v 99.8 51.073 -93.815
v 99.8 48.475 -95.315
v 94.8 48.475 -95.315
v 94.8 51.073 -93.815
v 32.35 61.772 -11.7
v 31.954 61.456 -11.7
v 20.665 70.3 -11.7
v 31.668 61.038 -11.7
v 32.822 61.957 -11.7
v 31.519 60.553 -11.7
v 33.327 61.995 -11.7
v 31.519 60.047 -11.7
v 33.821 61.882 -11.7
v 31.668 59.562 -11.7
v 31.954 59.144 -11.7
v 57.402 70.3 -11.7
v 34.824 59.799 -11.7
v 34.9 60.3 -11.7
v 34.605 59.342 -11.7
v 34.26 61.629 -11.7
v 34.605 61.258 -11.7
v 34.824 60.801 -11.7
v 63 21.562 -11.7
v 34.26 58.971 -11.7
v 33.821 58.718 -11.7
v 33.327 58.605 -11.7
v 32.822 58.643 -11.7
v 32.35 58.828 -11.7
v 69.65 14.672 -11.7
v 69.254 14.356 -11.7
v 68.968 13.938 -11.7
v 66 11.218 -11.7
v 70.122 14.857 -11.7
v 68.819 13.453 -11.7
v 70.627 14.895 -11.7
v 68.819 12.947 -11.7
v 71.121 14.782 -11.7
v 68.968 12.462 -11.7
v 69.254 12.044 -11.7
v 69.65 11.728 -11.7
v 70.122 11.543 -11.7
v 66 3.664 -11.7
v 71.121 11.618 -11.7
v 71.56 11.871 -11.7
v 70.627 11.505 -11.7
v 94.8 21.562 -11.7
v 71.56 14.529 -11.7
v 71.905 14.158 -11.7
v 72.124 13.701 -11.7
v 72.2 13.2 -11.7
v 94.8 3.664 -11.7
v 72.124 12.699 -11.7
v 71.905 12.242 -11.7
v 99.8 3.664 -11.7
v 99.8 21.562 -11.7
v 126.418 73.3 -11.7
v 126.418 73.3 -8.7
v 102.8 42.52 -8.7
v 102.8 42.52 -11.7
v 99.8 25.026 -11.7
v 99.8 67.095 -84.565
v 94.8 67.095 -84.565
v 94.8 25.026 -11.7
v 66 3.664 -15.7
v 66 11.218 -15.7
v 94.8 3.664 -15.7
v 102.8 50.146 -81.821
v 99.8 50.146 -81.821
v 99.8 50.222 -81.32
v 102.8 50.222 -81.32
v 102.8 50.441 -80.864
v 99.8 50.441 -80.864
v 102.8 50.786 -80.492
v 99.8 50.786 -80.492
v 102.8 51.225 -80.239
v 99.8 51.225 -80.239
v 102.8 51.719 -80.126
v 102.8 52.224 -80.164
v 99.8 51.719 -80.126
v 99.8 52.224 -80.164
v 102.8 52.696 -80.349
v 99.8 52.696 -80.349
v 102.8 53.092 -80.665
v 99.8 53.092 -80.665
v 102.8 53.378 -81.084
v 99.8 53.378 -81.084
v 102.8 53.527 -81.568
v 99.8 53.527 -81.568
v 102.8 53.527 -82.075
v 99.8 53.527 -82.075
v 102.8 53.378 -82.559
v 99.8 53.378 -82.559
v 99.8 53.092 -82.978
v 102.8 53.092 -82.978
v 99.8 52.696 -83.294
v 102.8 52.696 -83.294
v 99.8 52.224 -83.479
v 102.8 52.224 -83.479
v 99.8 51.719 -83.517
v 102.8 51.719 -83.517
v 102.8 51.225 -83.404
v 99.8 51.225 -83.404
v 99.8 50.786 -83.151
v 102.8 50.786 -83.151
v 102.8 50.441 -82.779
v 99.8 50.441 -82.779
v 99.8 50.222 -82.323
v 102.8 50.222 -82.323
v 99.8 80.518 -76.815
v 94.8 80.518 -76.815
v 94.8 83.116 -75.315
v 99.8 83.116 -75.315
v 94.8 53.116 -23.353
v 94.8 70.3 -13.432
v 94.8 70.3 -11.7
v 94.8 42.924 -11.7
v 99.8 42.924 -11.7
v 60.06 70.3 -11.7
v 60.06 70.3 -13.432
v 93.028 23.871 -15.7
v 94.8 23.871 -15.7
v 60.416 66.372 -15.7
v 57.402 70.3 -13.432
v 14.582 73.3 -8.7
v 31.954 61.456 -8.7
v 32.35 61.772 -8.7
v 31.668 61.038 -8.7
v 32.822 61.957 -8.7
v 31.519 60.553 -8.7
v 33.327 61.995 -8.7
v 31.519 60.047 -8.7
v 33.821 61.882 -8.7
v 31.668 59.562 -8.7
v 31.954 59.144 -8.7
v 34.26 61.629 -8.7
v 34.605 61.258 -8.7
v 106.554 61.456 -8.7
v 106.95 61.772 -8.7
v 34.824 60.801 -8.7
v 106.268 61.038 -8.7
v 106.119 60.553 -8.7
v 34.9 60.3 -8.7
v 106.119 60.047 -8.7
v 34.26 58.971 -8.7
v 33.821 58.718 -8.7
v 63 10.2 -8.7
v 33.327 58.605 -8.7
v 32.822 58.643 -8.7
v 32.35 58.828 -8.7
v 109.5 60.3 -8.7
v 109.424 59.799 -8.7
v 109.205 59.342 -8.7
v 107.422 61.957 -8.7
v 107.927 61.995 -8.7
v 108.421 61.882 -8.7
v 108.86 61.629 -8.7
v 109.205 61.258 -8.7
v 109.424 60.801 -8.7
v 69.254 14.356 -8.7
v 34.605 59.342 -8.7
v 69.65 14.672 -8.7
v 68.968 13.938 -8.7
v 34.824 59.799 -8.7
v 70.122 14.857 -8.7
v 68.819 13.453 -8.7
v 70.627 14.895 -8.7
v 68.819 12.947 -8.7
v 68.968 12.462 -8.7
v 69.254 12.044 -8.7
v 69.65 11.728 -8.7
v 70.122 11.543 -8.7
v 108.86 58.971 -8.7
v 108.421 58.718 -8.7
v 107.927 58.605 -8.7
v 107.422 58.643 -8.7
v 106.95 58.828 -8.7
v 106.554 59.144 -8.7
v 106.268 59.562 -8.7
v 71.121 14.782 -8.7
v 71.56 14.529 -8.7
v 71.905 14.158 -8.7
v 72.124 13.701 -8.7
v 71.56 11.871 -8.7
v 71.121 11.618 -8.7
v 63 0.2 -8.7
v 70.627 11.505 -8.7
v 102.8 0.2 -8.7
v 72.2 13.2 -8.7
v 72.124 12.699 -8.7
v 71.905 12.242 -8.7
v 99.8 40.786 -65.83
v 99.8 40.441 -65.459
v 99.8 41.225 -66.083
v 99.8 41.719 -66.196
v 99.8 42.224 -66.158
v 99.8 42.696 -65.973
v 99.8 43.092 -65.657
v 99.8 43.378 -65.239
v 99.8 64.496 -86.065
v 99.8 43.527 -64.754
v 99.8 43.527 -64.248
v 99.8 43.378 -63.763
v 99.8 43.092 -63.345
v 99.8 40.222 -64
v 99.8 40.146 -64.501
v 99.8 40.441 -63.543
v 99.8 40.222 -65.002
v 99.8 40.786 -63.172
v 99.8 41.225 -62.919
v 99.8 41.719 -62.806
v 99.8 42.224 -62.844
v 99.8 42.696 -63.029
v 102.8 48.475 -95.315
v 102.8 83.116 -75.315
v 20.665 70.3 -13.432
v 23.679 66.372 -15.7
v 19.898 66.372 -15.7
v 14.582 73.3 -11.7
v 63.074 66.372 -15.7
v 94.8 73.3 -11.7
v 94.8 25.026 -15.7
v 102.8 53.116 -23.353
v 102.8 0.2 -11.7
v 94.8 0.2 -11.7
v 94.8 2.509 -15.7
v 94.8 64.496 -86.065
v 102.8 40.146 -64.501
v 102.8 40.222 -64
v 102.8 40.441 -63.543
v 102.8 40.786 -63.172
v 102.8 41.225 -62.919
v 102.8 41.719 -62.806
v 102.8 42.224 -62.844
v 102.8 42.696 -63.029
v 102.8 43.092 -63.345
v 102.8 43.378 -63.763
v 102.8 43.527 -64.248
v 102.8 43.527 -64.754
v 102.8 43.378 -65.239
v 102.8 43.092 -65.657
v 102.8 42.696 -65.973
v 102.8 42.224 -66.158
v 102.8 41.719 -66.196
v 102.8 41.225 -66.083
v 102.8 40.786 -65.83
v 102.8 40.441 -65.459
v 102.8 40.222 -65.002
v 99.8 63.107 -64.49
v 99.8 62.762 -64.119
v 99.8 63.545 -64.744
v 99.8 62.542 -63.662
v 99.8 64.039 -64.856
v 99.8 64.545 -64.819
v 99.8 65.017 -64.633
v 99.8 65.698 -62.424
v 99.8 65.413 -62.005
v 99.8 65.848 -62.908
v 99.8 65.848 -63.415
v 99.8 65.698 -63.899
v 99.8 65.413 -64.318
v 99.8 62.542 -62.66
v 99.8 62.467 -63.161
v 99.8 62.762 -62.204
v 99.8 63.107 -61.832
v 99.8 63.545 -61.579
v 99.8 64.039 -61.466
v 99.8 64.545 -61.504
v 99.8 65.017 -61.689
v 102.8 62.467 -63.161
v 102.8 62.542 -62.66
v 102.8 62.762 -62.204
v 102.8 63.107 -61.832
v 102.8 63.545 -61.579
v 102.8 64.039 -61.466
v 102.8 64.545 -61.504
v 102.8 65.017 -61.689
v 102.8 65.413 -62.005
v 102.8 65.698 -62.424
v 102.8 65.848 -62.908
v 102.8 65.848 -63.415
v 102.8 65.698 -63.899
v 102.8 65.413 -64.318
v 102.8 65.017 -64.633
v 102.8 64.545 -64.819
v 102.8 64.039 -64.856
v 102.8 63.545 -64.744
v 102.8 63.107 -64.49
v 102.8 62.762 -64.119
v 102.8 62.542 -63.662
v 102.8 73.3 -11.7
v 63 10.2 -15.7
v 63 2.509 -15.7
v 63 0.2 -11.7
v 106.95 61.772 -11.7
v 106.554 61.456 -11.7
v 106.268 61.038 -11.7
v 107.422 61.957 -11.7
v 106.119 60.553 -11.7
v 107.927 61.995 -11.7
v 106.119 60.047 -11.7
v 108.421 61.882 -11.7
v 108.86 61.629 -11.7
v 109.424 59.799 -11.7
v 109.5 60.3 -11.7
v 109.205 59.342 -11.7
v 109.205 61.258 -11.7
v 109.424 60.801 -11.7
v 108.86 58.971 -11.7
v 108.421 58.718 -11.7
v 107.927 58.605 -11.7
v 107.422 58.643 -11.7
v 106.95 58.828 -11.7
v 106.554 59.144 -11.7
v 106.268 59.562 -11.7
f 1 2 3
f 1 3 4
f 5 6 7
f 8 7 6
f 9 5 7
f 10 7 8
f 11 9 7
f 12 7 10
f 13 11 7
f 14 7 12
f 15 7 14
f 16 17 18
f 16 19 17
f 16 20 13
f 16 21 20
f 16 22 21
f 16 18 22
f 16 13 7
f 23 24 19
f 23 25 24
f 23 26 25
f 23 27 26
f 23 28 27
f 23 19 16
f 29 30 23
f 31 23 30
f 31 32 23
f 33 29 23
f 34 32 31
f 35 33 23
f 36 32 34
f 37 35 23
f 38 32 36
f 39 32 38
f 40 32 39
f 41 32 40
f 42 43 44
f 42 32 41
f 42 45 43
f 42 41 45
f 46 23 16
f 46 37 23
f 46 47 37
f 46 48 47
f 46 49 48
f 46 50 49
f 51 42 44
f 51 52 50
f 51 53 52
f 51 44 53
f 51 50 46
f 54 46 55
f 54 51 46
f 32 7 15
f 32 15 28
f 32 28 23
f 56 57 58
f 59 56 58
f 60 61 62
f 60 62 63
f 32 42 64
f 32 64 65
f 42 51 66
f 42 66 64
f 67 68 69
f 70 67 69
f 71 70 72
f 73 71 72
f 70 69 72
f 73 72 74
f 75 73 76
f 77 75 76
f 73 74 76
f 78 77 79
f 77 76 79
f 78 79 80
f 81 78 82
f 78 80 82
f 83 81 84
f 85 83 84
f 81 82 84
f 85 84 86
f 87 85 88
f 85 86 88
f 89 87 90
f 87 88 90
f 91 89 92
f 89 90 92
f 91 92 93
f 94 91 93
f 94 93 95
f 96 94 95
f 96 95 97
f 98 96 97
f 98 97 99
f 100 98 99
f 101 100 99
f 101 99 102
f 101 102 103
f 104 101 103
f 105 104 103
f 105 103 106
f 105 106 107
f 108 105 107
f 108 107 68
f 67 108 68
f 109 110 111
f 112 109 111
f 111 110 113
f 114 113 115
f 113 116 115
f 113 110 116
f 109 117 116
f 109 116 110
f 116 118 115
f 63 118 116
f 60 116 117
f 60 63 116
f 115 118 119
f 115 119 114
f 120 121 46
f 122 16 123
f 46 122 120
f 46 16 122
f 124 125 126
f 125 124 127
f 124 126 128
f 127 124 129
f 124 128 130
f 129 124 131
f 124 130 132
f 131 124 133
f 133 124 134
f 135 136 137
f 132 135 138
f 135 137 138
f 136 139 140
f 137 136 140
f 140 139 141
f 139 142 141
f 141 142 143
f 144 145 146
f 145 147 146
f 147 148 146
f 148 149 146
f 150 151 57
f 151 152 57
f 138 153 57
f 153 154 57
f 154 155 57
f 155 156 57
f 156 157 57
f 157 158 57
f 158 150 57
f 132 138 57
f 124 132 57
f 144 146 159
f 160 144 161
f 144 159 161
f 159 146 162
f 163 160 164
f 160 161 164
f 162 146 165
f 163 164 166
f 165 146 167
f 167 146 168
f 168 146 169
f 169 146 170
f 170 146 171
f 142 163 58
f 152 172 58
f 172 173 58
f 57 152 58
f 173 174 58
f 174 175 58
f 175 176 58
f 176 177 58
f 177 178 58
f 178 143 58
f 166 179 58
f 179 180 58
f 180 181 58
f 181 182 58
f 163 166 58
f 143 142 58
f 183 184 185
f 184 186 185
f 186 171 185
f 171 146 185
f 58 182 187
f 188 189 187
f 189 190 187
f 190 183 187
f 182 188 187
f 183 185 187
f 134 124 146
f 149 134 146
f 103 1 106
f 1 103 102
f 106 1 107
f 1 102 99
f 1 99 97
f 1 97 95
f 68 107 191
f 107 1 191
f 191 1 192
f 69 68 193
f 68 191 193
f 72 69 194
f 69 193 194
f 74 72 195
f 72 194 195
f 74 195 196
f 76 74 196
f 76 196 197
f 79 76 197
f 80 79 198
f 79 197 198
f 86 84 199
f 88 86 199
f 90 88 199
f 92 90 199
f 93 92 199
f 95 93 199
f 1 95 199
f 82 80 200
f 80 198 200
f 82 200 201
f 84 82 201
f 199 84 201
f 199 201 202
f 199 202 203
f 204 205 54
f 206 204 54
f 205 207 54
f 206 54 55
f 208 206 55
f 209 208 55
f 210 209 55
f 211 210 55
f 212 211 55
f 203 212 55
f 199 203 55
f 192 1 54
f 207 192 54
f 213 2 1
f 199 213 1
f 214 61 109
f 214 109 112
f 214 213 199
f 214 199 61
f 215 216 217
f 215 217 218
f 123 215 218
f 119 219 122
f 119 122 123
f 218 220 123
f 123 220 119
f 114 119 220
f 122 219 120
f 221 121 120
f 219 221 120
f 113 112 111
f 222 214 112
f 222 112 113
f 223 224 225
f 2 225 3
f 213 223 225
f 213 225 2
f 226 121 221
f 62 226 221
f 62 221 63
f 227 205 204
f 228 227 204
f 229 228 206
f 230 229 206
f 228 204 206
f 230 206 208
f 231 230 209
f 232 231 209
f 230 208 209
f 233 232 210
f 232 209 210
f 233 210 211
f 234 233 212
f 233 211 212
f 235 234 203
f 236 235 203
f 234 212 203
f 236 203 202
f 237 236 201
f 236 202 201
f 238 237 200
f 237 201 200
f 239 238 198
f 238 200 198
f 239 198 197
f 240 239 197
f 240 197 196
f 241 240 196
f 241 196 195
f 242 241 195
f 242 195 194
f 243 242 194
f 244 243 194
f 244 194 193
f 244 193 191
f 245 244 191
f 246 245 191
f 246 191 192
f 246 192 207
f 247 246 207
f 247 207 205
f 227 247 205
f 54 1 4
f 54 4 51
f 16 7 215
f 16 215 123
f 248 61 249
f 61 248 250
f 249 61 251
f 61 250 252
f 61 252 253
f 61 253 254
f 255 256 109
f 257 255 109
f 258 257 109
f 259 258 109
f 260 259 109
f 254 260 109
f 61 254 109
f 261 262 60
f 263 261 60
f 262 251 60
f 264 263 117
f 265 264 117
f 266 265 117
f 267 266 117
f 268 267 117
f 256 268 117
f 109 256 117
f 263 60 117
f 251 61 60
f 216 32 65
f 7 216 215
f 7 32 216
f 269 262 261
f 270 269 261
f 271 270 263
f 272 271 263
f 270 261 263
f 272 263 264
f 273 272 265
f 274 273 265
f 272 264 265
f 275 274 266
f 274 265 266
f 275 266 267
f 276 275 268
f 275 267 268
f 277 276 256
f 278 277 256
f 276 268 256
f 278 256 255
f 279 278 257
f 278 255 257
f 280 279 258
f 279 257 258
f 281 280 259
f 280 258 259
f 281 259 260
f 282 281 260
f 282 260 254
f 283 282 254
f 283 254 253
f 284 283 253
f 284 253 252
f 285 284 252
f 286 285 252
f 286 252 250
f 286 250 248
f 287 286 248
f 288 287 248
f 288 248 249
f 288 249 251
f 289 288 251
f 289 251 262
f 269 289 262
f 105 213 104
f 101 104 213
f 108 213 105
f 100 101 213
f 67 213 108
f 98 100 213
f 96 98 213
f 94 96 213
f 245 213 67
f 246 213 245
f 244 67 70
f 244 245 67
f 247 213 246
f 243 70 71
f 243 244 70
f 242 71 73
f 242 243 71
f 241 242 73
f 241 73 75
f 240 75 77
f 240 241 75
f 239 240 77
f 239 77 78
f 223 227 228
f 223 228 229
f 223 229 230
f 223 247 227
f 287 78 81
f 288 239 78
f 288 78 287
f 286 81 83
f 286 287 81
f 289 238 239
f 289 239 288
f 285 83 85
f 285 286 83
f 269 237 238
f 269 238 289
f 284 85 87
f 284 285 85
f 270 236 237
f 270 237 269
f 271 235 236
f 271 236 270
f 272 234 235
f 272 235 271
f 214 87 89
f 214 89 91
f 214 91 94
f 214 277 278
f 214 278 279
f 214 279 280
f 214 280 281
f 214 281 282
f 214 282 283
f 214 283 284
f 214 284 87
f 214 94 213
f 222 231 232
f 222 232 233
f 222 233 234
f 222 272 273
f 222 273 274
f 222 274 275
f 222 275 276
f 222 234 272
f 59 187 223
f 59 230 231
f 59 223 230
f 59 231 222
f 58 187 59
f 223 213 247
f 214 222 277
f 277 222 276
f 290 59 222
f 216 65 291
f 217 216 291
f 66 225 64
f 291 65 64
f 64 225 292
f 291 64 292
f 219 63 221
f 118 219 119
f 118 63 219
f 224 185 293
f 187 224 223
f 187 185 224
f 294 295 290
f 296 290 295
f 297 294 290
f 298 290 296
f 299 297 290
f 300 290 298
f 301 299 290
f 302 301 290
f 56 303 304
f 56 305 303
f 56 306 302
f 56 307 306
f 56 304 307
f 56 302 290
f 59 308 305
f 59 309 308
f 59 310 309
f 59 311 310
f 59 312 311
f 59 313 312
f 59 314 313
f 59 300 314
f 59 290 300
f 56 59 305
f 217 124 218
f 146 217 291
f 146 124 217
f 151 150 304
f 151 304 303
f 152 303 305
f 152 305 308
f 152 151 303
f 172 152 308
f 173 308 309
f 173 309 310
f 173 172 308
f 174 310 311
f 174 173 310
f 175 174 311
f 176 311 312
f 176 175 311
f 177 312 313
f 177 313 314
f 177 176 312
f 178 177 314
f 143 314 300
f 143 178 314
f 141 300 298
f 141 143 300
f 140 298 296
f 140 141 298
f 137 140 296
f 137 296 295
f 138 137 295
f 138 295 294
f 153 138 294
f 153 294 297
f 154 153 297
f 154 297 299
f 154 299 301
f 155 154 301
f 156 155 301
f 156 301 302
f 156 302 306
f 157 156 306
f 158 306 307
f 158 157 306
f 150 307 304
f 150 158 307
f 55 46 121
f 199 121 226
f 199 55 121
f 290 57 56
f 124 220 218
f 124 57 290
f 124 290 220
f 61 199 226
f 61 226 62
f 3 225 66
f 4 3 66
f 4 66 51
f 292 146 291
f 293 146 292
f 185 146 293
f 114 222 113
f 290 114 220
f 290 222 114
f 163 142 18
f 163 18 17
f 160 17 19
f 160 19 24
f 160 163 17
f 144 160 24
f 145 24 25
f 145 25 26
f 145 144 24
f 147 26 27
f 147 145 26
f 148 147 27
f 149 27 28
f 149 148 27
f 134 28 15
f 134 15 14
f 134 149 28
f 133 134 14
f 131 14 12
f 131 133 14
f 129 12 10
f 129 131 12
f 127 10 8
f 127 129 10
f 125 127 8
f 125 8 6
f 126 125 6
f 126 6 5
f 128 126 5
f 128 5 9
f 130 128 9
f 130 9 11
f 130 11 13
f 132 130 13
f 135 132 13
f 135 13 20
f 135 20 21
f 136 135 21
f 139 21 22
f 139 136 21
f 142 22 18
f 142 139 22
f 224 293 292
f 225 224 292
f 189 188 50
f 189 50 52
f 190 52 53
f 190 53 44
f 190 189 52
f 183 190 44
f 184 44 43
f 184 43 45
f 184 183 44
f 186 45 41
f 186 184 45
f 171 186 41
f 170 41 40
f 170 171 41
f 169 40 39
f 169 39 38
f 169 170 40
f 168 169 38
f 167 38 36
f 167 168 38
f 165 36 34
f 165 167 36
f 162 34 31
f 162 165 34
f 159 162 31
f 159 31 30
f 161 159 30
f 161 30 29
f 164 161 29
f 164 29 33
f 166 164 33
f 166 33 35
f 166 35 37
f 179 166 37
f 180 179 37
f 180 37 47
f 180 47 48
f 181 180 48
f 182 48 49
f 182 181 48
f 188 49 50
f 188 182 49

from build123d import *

# Parameters (mm, degrees)
SKETCH027_R     = 1.7
PAD016_DEPTH    = 3
PAD017_DEPTH    = 3
SKETCH029_R     = 1.7
POCKET007_DEPTH = 26.619333
PAD018_DEPTH    = 5
PAD019_DEPTH    = 4
POCKET011_DEPTH = 31.8
POCKET012_DEPTH = 80.219333


with BuildPart() as part:
    # Sketch027 (on Face4 of Binder003) → Pad016 (new body)
    with BuildSketch(Plane(origin=(0, 0, -8.7), x_dir=(1, 0, 0), z_dir=(0, 0, -1))):
        Polygon((63, -0.2), (63, -10.2), (14.581667, -73.3), (126.418333, -73.3), (102.8, -42.519989), (102.8, -0.2), align=None)
        with Locations((70.5, -13.2)):
            Circle(SKETCH027_R, mode=Mode.SUBTRACT)
        with Locations((107.8, -60.3)):
            Circle(SKETCH027_R, mode=Mode.SUBTRACT)
        with Locations((33.2, -60.3)):
            Circle(SKETCH027_R, mode=Mode.SUBTRACT)
    extrude(amount=PAD016_DEPTH)

    # Sketch028 (on Face6 of Pad016) → Pad017 (join)
    with BuildSketch(Plane.YZ.offset(102.8)):
        Polygon((0.2, -11.7), (48.475, -95.314753), (83.116016, -75.314753), (53.116016, -23.353229), (73.3, -11.7), align=None)
    extrude(amount=-PAD017_DEPTH)

    # Sketch029 (on Face14 of Pad017) → Pocket007 (cut, through all)
    with BuildSketch(Plane(origin=(99.8, 0, 0), x_dir=(0, -1, 0), z_dir=(-1, 0, 0))):
        with Locations((-51.846002, -81.821499)):
            Circle(SKETCH029_R)
        with Locations((-41.846002, -64.500991)):
            Circle(SKETCH029_R)
        with Locations((-64.16651, -63.161245)):
            Circle(SKETCH029_R)
    extrude(amount=-POCKET007_DEPTH, mode=Mode.SUBTRACT)

    # Sketch030 (on Face14 of Pocket007) → Pad018 (join)
    with BuildSketch(Plane(origin=(99.8, 0, 0), x_dir=(0, -1, 0), z_dir=(-1, 0, 0))):
        Polygon((-0.2, -11.7), (-48.475, -95.314753), (-51.073076, -93.814753), (-3.664102, -11.7), align=None)
        Polygon((-42.92392, -11.7), (-80.51794, -76.814753), (-83.116016, -75.314753), (-53.116016, -23.353229), (-73.3, -11.7), align=None)
        Polygon((-21.56196, -11.7), (-64.49647, -86.064753), (-67.094546, -84.564753), (-25.026062, -11.7), align=None)
    extrude(amount=PAD018_DEPTH)

    # Sketch031 (on Face5 of Pad018) → Pad019 (join)
    with BuildSketch(Plane(origin=(0, 0, -11.7), x_dir=(1, 0, 0), z_dir=(0, 0, -1))):
        Polygon((94.8, -3.664102), (66, -3.664102), (66, -11.218363), (20.665065, -70.3), (57.401987, -70.3), (94.8, -21.56196), (94.8, -25.026062), (60.060085, -70.3), (94.8, -70.3), (94.8, -73.3), (14.581667, -73.3), (63, -10.2), (63, -0.2), (94.8, -0.2), align=None)
    extrude(amount=PAD019_DEPTH)

    # Sketch036 (on Face16 of Pad019) → Pocket011 (cut)
    with BuildSketch(Plane.YZ.offset(94.8)):
        Polygon((2.509401, -15.7), (0.2, -15.7), (0.2, -11.7), align=None)
        Polygon((23.871361, -15.7), (21.56196, -11.7), (21.56196, -15.7), align=None)
    extrude(amount=-POCKET011_DEPTH, mode=Mode.SUBTRACT)

    # Sketch037 (on Face30 of Pocket011) → Pocket012 (cut, through all)
    with BuildSketch(Plane.YZ.offset(94.8)):
        Polygon((73.3, -11.7), (73.3, -15.7), (66.371797, -15.7), align=None)
    extrude(amount=-POCKET012_DEPTH, mode=Mode.SUBTRACT)


solid = part.part
